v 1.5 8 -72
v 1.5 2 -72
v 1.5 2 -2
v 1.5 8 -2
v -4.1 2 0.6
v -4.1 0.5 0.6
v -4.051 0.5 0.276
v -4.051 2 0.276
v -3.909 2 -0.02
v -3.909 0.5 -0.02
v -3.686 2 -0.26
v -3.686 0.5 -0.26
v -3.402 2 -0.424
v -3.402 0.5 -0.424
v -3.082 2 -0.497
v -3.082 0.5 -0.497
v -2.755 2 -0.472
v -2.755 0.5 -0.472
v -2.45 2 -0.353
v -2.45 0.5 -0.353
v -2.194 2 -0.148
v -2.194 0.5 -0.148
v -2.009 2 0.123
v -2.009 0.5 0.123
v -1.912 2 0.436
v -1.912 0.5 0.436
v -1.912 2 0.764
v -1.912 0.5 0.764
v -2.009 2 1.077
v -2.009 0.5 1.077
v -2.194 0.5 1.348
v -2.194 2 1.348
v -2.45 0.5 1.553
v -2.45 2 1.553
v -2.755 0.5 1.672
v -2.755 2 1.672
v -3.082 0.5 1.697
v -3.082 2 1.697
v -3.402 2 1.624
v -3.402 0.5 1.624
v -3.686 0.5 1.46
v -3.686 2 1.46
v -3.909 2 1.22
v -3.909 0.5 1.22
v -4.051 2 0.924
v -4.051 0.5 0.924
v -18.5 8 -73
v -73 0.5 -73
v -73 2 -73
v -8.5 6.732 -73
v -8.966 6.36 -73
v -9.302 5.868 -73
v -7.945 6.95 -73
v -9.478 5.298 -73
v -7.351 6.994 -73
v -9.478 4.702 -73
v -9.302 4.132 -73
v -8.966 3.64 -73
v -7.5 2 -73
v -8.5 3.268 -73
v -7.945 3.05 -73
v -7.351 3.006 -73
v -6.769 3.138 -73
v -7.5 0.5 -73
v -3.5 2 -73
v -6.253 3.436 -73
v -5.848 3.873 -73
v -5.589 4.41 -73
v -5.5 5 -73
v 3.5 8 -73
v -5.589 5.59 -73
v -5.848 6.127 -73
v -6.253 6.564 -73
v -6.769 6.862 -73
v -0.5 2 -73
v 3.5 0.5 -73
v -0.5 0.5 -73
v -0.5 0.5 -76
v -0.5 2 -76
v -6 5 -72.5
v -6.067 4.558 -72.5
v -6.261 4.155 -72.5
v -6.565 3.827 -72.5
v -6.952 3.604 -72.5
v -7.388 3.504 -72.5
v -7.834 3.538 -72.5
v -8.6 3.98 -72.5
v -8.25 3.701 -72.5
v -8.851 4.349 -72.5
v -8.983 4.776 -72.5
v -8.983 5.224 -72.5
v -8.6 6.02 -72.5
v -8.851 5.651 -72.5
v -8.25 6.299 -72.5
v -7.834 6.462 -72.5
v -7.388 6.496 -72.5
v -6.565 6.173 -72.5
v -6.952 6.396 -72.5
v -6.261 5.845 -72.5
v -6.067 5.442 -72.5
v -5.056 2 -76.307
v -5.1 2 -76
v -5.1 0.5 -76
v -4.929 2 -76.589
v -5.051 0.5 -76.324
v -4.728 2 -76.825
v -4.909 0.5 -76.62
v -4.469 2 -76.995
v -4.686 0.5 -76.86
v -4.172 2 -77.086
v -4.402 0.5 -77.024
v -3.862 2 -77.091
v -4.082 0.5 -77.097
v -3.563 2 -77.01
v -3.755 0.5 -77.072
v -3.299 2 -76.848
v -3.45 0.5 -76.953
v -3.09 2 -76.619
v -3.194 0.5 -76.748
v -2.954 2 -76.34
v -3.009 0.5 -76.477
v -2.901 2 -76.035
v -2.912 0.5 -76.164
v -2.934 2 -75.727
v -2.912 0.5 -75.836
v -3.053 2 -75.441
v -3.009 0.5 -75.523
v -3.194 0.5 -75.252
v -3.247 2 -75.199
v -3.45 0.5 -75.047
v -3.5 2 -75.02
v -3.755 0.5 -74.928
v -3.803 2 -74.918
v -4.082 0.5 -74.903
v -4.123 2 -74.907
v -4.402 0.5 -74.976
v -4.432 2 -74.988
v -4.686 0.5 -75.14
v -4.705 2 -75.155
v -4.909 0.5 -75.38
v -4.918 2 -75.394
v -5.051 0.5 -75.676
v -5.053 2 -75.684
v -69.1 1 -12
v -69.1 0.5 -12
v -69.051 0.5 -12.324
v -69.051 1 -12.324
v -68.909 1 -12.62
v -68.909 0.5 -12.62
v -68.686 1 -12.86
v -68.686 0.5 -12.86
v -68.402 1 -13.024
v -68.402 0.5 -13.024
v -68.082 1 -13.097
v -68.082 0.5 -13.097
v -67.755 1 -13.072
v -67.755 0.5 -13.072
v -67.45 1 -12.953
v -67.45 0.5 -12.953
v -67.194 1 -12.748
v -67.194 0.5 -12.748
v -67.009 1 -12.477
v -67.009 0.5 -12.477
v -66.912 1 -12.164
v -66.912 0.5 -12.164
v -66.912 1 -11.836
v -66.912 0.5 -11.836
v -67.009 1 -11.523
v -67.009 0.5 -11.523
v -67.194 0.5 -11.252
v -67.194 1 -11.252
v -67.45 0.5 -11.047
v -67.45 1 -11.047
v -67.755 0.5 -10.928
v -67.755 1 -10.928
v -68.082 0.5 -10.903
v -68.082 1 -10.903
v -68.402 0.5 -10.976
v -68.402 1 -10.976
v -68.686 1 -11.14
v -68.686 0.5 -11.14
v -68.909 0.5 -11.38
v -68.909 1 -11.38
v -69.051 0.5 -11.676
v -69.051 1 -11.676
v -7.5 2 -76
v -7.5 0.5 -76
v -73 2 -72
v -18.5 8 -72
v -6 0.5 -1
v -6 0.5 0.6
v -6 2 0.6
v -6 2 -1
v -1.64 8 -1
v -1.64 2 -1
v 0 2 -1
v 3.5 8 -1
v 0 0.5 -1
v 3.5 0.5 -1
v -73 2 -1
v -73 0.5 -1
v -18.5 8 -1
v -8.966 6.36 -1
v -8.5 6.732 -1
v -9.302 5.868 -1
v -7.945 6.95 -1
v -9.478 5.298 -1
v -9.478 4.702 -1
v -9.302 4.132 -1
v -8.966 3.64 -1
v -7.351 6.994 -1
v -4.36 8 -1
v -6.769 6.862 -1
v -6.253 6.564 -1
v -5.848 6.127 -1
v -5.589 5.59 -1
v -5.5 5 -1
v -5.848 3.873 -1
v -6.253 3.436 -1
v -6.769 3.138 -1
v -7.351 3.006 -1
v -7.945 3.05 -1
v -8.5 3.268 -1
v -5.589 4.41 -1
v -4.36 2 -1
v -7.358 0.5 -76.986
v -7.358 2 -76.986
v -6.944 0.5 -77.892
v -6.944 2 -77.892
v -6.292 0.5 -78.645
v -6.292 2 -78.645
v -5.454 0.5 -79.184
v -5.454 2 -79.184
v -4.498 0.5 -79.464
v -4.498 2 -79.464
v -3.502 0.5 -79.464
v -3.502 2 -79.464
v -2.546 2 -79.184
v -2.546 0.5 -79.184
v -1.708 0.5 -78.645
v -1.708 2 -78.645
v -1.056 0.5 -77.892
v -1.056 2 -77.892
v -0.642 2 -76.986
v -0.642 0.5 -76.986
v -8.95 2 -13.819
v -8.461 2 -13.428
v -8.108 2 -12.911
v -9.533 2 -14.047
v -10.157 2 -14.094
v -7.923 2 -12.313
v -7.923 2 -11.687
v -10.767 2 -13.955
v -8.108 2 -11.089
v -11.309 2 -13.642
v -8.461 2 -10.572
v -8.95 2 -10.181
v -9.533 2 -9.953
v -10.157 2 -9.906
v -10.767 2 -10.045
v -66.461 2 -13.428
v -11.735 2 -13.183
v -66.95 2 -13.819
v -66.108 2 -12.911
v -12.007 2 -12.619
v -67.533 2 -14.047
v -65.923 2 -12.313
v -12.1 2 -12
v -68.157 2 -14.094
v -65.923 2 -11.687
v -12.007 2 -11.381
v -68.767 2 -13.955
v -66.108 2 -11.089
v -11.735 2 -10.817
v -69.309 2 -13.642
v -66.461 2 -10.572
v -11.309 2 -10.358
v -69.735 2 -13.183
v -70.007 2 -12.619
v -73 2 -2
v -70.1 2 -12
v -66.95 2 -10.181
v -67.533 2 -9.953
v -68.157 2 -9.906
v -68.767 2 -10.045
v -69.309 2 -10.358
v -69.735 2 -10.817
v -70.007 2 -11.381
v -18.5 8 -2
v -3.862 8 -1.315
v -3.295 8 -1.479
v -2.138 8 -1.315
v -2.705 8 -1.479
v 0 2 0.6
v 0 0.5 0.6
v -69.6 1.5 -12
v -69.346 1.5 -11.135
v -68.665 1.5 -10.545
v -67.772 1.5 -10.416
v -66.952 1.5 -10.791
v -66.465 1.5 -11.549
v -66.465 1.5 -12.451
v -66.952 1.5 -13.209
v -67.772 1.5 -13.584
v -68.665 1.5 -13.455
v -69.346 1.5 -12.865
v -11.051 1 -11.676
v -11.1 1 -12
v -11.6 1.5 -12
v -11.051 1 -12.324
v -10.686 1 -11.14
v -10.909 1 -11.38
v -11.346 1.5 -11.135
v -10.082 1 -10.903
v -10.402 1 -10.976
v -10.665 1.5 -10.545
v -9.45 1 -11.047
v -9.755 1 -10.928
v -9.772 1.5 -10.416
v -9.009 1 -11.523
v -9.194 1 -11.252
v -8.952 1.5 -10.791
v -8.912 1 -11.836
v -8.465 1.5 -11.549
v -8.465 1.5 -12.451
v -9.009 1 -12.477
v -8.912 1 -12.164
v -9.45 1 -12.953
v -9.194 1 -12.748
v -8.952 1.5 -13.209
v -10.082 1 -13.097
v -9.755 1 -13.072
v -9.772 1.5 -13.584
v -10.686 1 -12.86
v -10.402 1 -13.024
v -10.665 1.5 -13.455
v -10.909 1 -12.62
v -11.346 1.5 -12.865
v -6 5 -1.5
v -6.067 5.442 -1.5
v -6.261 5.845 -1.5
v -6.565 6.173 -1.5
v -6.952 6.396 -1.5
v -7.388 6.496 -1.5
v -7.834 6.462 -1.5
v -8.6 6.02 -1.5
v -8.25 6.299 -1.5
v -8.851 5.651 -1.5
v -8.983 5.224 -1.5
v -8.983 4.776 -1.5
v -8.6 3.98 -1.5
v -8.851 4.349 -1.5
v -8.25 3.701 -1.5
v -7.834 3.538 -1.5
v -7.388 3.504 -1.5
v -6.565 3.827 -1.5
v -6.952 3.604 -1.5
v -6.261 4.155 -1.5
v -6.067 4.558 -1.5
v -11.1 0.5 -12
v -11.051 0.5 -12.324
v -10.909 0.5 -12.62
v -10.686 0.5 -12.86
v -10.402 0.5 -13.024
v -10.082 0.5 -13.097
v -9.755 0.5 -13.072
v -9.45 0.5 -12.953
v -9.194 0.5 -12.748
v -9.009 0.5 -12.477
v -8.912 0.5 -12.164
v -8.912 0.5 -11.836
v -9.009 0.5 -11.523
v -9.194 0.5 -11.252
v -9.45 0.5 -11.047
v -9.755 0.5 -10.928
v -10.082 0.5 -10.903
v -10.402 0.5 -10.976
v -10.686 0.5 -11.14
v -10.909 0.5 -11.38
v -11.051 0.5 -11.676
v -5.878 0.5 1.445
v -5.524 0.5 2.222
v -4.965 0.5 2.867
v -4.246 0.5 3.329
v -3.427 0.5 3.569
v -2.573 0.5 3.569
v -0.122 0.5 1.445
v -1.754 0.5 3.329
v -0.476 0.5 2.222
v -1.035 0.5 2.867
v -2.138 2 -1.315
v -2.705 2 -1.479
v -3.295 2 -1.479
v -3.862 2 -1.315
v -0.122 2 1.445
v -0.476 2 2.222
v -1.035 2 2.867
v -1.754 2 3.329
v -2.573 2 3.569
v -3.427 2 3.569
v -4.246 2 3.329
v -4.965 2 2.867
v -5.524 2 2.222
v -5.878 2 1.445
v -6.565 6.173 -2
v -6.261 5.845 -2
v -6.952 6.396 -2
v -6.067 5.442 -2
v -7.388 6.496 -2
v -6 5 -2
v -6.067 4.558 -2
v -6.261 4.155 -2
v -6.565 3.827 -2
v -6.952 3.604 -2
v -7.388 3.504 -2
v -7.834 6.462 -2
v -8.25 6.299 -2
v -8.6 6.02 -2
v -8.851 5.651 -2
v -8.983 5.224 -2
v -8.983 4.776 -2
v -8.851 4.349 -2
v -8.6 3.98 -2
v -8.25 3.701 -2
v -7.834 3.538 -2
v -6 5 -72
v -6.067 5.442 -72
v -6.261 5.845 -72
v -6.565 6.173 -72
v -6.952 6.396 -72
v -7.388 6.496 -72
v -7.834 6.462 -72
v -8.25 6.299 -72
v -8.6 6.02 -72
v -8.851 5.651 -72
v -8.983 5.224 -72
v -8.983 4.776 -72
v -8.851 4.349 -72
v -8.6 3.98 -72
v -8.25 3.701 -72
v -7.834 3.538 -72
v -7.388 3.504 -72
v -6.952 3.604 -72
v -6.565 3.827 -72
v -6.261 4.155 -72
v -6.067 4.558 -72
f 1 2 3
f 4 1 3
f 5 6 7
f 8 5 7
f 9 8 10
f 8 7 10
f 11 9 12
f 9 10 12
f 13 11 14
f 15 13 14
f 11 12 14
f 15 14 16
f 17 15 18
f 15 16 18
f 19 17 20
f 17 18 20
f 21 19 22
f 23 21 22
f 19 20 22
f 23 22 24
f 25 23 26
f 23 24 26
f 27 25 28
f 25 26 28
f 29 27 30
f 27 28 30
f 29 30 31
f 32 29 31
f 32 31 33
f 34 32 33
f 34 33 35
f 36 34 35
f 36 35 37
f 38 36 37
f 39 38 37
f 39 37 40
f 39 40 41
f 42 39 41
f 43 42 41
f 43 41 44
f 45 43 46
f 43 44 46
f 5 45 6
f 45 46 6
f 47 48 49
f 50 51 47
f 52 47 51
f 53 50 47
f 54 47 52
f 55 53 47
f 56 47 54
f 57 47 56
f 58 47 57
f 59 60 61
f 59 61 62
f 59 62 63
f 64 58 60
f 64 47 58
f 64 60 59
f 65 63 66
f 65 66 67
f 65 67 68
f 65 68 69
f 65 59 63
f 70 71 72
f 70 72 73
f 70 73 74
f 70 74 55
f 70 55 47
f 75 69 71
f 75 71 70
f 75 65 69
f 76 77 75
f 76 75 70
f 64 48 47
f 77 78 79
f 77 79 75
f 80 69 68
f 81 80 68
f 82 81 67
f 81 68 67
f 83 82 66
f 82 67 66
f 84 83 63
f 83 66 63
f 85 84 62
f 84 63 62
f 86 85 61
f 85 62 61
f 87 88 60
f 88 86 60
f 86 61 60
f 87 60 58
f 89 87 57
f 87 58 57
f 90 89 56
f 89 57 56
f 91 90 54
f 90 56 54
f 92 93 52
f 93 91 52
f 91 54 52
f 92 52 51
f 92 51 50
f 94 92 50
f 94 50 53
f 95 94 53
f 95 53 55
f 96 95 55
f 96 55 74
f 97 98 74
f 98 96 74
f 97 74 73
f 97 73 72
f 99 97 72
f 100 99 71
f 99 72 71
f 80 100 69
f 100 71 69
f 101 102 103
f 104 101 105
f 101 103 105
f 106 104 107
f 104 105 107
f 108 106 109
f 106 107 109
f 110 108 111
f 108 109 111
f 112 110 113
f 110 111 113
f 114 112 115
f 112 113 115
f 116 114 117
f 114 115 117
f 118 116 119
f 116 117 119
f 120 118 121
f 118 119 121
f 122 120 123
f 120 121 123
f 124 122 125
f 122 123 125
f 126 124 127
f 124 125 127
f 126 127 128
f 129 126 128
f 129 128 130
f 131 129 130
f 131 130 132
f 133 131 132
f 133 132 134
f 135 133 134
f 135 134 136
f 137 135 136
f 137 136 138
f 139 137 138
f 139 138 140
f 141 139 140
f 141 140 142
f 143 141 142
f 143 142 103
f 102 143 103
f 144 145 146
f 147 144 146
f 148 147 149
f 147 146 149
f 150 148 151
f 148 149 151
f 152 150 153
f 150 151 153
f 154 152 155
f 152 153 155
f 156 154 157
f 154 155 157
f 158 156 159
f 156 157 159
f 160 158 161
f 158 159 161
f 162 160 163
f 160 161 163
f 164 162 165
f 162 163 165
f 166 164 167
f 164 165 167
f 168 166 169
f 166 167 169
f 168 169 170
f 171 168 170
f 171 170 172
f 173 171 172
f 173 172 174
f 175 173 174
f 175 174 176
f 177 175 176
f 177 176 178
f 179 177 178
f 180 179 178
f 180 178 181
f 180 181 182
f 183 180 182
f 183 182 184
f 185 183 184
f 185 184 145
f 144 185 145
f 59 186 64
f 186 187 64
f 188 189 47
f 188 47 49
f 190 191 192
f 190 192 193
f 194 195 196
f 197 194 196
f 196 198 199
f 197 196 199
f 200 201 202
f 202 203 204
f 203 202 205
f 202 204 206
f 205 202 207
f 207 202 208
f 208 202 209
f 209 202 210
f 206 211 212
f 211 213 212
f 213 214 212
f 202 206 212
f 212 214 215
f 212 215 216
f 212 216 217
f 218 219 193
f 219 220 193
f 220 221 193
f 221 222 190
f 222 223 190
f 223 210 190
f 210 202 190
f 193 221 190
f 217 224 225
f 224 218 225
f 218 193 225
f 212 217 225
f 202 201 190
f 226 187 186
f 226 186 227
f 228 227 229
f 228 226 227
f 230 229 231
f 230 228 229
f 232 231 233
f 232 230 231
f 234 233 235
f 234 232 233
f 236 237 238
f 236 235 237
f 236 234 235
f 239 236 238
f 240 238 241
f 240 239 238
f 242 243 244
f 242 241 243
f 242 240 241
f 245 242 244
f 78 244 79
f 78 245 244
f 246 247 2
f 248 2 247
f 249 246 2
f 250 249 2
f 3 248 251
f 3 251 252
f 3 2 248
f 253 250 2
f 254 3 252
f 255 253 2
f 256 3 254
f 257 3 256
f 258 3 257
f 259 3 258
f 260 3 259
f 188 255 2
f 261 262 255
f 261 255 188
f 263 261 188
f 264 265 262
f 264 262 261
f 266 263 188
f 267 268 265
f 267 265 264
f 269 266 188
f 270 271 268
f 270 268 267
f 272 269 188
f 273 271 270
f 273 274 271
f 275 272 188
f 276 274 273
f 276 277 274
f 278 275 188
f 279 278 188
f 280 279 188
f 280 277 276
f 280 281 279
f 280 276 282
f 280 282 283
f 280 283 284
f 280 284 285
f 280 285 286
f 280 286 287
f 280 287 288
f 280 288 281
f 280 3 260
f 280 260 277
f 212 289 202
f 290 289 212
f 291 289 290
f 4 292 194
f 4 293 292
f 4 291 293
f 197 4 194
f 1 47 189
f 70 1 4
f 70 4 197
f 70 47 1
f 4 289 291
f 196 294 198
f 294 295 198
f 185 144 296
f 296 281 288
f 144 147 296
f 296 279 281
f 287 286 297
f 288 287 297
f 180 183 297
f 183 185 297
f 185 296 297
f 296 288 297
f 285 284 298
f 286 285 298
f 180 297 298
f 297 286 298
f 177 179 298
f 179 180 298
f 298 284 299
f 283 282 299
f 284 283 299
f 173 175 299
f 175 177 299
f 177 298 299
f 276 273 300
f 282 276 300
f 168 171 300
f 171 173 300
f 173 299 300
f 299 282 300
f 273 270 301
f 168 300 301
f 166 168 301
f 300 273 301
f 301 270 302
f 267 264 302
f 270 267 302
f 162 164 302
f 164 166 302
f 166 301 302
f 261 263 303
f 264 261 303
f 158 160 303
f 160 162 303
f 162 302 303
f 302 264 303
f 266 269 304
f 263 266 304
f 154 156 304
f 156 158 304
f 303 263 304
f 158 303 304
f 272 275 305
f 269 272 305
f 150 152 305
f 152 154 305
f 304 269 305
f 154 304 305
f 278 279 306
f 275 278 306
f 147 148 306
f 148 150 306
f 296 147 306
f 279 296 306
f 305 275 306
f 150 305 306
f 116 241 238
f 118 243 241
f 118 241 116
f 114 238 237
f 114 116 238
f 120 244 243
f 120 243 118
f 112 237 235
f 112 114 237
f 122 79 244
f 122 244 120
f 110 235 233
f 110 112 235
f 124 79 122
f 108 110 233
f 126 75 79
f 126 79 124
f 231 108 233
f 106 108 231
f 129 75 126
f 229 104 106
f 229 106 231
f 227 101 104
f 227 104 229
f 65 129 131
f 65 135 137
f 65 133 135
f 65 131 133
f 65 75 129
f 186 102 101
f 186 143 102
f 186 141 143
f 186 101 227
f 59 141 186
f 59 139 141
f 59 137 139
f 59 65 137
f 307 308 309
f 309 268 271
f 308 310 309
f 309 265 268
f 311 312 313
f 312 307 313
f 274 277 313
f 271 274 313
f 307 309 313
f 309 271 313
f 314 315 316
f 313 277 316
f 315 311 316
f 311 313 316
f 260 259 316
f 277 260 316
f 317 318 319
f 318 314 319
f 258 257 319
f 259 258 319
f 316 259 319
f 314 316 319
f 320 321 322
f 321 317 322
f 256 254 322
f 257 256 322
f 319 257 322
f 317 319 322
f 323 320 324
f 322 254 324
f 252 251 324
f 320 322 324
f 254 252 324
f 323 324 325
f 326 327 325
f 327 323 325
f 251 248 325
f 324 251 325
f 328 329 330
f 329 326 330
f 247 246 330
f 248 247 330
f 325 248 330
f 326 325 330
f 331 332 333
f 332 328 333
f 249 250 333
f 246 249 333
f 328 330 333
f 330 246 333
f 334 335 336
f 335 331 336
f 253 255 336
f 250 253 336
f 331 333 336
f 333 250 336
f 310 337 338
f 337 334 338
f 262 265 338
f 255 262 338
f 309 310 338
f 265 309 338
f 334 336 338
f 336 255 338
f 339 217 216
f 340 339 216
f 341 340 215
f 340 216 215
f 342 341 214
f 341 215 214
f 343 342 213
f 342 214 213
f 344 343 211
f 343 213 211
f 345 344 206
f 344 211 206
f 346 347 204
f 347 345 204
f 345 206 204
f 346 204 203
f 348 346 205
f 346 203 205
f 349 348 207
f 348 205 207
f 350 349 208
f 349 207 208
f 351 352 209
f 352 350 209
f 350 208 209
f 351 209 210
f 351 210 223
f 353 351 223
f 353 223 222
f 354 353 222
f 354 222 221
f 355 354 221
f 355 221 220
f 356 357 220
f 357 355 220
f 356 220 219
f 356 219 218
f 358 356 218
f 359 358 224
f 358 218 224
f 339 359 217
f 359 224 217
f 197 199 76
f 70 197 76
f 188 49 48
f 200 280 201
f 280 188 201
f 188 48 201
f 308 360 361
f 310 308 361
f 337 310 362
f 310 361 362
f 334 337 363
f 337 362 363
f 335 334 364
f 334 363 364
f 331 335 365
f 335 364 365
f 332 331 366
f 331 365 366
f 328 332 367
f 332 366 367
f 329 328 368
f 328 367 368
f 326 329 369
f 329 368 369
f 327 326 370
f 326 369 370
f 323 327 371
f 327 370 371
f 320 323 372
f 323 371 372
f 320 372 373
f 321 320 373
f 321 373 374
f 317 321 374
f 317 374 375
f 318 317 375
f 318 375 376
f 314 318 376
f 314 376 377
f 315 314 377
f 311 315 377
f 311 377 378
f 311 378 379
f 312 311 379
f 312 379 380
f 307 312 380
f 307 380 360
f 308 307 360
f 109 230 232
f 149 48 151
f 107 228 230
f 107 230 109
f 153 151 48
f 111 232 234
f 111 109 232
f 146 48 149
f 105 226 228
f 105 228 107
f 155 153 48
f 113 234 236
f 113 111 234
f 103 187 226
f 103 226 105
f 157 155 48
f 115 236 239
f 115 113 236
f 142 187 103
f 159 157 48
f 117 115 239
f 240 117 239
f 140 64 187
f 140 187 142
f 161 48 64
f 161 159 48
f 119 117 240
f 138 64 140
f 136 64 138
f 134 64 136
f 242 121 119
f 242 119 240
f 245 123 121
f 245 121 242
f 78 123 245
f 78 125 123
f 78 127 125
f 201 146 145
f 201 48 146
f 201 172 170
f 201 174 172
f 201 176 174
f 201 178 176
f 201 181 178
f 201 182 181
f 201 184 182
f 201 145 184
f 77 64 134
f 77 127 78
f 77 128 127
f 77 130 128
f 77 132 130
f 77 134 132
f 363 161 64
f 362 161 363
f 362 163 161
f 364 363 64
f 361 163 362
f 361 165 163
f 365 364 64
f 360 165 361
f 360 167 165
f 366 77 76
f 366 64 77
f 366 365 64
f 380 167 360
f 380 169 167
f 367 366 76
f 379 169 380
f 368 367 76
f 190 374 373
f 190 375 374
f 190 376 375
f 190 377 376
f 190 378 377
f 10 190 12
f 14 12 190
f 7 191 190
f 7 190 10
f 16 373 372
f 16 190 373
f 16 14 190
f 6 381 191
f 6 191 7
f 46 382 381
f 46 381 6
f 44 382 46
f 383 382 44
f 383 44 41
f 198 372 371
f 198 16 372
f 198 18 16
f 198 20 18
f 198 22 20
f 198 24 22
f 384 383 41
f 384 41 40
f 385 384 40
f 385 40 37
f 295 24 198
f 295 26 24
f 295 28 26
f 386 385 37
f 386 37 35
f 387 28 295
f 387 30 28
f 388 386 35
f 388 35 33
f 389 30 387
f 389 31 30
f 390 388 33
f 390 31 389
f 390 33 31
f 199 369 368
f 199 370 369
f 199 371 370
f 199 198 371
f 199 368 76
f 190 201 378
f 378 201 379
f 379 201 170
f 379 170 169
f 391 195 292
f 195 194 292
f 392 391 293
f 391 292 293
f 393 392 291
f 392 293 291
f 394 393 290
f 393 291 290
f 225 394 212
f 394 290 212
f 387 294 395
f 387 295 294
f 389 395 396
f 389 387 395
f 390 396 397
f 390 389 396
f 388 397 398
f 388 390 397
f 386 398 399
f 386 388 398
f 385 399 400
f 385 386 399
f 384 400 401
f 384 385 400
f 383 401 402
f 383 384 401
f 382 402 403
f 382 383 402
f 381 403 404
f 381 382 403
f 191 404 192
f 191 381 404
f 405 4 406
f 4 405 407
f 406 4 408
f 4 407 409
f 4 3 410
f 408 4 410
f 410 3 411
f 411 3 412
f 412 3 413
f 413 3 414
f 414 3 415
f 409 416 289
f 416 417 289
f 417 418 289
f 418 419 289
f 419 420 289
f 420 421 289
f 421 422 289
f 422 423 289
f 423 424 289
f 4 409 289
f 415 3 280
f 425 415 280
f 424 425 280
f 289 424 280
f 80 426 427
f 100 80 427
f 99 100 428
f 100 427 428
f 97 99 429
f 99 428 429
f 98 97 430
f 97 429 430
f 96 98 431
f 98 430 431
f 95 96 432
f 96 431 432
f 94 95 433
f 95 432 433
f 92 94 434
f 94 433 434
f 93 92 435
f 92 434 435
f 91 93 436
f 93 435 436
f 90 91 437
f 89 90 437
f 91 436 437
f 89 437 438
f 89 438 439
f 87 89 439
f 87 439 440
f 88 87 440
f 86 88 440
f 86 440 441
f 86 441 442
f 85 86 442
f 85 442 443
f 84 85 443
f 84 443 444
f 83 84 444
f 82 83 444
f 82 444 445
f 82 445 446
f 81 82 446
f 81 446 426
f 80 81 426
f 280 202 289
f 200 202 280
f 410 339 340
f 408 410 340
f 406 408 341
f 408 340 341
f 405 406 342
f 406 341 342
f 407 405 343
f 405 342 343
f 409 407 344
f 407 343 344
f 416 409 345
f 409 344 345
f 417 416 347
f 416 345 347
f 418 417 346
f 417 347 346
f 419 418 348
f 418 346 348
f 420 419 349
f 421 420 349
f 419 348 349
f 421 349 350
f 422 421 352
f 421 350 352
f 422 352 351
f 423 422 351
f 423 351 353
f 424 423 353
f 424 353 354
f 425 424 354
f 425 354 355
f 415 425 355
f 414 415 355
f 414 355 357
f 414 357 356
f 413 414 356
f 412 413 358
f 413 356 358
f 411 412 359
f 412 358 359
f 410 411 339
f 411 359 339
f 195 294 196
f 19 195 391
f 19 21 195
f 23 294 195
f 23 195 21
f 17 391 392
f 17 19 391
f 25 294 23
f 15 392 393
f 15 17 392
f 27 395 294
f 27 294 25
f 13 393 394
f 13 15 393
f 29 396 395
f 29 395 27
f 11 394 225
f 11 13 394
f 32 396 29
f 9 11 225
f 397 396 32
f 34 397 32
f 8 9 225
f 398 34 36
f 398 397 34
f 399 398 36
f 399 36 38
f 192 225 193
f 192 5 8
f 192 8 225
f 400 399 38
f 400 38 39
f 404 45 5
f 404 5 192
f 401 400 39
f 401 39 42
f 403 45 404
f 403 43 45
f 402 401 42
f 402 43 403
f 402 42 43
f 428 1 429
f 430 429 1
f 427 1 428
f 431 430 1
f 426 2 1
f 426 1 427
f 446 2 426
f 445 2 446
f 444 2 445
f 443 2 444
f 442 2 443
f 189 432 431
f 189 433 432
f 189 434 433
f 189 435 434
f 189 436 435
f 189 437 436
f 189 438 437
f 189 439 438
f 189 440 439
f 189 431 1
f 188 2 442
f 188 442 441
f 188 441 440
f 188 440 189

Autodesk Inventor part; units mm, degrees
ref_plane "YZ Plane" through (0, 0, 0) normal (1, 0, 0) x (0, 1, 0)
ref_plane "XZ Plane" through (0, 0, 0) normal (0, 1, 0) x (-1, 0, 0)
ref_plane "XY Plane" through (0, 0, 0) normal (0, 0, 1) x (1, 0, 0)
sketch "Эскиз1" plane through (0, 0, 0) normal (0, 1, 0) x (-1, 0, 0)
  line L0 (-3.5, 0) -> (-3.5, -76)
  line L1 (0, 0) -> (0, -2)
  line L2 (0, -2) -> (0, -1)
  line L3 (0, -72) -> (0, -73)
  line L4 (0, 0) -> (0, -12)
  line L5 (0, -12) -> (8, -12)
  line L6 (8, -12) -> (56, -12)
  line L7 (56, -12) -> (62, -12)
  line L8 (62, -12) -> (62, -1)
  line L9 (62, -1) -> (0, -1)
  line L10 (0, -73) -> (62, -73)
  line L11 (62, -73) -> (62, -12)
  line L12 (0, -72) -> (62, -72)
  line L13 (0, -2) -> (62, -2)
  line L14 (3.5, -76) -> (3.5, 0)
  line L15 (0, 0) -> (3, 0)
  line L16 (3, 0) -> (3, 0.6)
  line L17 (56, -12) -> (68, -12)
  line L18 (68, -12) -> (73, -12)
  line L19 (8, -12) -> (10, -12)
  circle A0 centre (10, -12) radius 1.1
  circle A1 centre (68, -12) radius 1.1
  circle A2 centre (3, 0.6) radius 1.1
  circle A3 centre (3, 0.6) radius 3
  circle A4 centre (4, -76) radius 1.1
  circle A5 centre (4, -76) radius 3.5
  line L20 (7.5, -76) -> (7.5, -73)
  line L21 (0.5, -76) -> (0.5, -73)
  line L22 (0, -73) -> (-3.5, -73)
  line L23 (6, 0.6) -> (6, -1)
  line L24 (0, -1) -> (-3.5, -1)
  line L25 (62, -73) -> (73, -73)
  line L26 (73, -73) -> (73, -1)
  line L27 (73, -1) -> (62, -1)
  line L28 (62, -1) -> (62, -73)
  line L29 (0, 0.6) -> (0, 0)
  point P0 (3.5, -73)
  point P1 (0.0606, 0)
  dimension "d6" = 2
  dimension "d7" = 1
  dimension "d8" = 1
  dimension "d9" = 12
  dimension "d10" = 8
  dimension "d11" = 48
  dimension "d12" = 6
  dimension "d39" = 3
  dimension "d40" = 0.6
  dimension "d41" = 12
  dimension "d42" = 5
  dimension "d43" = 2
  dimension "d44" = 2.2
  dimension "d45" = 2.2
  dimension "d46" = 2.2
  dimension "d47" = 6
  dimension "d48" = 2.2
  dimension "d49" = 7
extrude "Выдавливание1" add sketch "Эскиз1" along normal blind 2 contours L24 L1 L4 L5 L14 L12 L3 L22 L0 | L9 A3 L13 L1 | L1 L15 A3 L9 | L3 L12 L14 A5 L10 | L29 A3 L15 | L13 A3 L14 L5 L4 | A3 L15 A2 L14 L9 | L9 L14 L13 A3 | L10 A5 L21 | A3 L9 L14 A2 L15 | L13 L14 A3 | L9 A3 L13 L14 | L14 L5 L6 A0 L7 L11 L12 | L12 L11 L10 A5 L14 | A5 L14 L10 | L10 A5 | L23 L9 A3 | L14 A3 L13 L8 L7 L6 A0 L5 | L13 A3 L14 | L9 L8 L13 A3 | L11 L17 A1 L18 L26 L25 | A5 L10 L14 | A5 L10 L20 | L8 L27 L26 L18 A1 L17
sketch "Эскиз2" plane through (0, 2, 0) normal (0, 1, 0) x (1, 0, 0)
  line L0 (-73, 1) -> (-6, 1) projected
  line L1 (3.5, 1) -> (3.5, 73) projected
  line L2 (-73, 1) -> (3.5, 1)
  line L3 (3.5, 1) -> (3.5, 2)
  line L4 (3.5, 2) -> (-73, 2)
  line L5 (-73, 2) -> (-73, 1)
  line L6 (-7.5, 73) -> (-73, 73) projected
  line L7 (-73, 73) -> (3.5, 73)
  line L8 (3.5, 73) -> (3.5, 72)
  line L9 (3.5, 72) -> (-73, 72)
  line L10 (-73, 72) -> (-73, 73)
  line L11 (0, 1) -> (3.5, 1) projected
  line L12 (3.5, 73) -> (1.5, 73)
  line L13 (1.5, 73) -> (1.5, 1)
  line L14 (1.5, 1) -> (3.5, 1)
  line L15 (3.5, 1) -> (3.5, 73)
  point P0 (-62, 73)
  point P1 (1.5, 72)
  point P2 (1.5, 2)
  dimension "d50" = 1
  dimension "d51" = 1
  dimension "d52" = 2
extrude "Выдавливание2" add sketch "Эскиз2" along normal blind 6
sketch "Эскиз3" plane through (-62, 0, -1) normal (0, 0, 1) x (1, 0, 0)
  line L0 (65.5, 8) -> (-11, 8) projected
  line L1 (65.5, 8) -> (43.5, 8)
  line L2 (63.5, 8) -> (54.5, 8)
  line L3 (54.5, 8) -> (54.5, 5)
  circle A0 centre (54.5, 5) radius 1.5
  line L4 (-11, 2) -> (63.5, 2) projected
  line L5 (43.5, 8) -> (-11, 2)
  line L6 (-11, 2) -> (-11, 8)
  line L7 (43.5, 8) -> (-11, 8)
  point P0 (65.5, 2)
  dimension "d53" = 22
  dimension "d54" = 9
  dimension "d55" = 3
  dimension "d56" = 3
extrude "Выдавливание3" cut sketch "Эскиз3" against normal blind 76
sketch "Эскиз4" plane through (0, 8, 0) normal (0, 1, 0) x (1, 0, 0)
  circle A0 centre (-3, -0.6) radius 1.1 projected
  circle A1 centre (-3, -0.6) radius 2.1
  dimension "d57" = 4.2
extrude "Выдавливание4" cut sketch "Эскиз4" against normal blind 6 contours A0 | A1
chamfer "Фаска1" distance 1 angle 45 2 edges at (-8.9, 2, -12) (-66.9, 2, -12)
chamfer "Фаска2" distance 0.5 angle 45 2 edges at (-9, 5, -1) (-9, 5, -73)
sketch "Эскиз5" plane through (0, 0, 0) normal (0, -1, 0) x (1, 0, 0)
  line L0 (31.0823, 41.3034) -> (-105.9038, 41.3034)
  line L1 (-105.9038, 41.3034) -> (-105.9038, -112.9994)
  line L2 (-105.9038, -112.9994) -> (31.0823, -112.9994)
  line L3 (31.0823, -112.9994) -> (31.0823, 41.3034)
  point P0 (0, 0)
extrude "Выдавливание5" cut sketch "Эскиз5" against normal blind 0.5
properties part number "HDD"
